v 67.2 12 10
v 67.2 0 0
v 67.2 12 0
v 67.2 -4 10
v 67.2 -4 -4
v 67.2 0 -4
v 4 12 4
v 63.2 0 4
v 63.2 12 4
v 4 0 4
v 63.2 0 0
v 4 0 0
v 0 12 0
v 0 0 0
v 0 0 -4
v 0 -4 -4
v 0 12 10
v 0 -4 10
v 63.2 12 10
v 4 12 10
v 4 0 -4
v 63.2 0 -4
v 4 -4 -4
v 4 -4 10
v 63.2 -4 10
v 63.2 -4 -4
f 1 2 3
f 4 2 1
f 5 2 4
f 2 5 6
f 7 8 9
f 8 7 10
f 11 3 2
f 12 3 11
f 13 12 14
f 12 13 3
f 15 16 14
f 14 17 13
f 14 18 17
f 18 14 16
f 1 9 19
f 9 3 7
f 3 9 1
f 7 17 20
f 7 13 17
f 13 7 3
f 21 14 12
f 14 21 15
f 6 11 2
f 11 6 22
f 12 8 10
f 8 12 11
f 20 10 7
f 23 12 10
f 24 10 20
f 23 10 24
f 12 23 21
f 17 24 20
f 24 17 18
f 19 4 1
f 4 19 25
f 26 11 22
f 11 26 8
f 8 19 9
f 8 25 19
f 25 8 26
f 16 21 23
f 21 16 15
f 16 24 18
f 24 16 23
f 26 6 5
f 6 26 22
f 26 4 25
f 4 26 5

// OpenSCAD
base_width = 59 + 0.2; // Base of camera is ~59mm
base_height = 4; // Enough height so camera hook doesn't cover the screen
base_depth = 12; // About the same depth as the flat area on top of my screen
side_wall_height = 6; // Same height as the thickness of the camera mount
side_wall_width = 4; // Thickness of the side walls
front_hook_depth = 4; // Thickness of the hooks
front_hook_size = 4; // Depth of the hooks

module myObject() {
  // Make base
  cube([base_width + (side_wall_width * 2), base_depth, base_height]);

  // Add side walls
  cube([side_wall_width, base_depth, side_wall_height + base_height]);
  translate([base_width + side_wall_width, 0, 0]) cube([side_wall_width, base_depth, side_wall_height + base_height]);

  // Add Front hooks
  translate([0,-front_hook_depth,-front_hook_size]) cube([side_wall_width,front_hook_depth,front_hook_size+base_height+side_wall_height]);
  translate([base_width + side_wall_width,-front_hook_depth,-front_hook_size]) cube([side_wall_width,front_hook_depth,front_hook_size+base_height+side_wall_height]);
}

myObject();
